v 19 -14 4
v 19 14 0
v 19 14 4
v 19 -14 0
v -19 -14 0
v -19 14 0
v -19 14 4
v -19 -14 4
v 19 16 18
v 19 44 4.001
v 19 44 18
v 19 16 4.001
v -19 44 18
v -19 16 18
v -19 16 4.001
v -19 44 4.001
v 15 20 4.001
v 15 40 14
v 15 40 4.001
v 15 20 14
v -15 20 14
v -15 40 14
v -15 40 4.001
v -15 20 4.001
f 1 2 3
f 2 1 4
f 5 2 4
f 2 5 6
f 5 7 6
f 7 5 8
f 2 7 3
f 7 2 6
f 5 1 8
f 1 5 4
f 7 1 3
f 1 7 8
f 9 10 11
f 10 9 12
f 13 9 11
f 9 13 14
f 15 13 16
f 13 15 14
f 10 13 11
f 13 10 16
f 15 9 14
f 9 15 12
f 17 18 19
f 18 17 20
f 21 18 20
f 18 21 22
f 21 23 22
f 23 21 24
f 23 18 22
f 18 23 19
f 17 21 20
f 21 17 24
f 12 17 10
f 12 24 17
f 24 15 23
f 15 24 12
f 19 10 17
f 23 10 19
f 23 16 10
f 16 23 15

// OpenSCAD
// file: shapes.scad
module prism(l, w, h) {
	translate([-w/2, -l/2, -h/2]) polyhedron(points=[
		[0,0,h],
		[0,0,0],[w,0,0],
		[0,l,h],
		[0,l,0],[w,l,0]
	], faces=[
		[0,2,1],
		[3,4,5],
		[0,1,4,3],
		[1,2,5,4],
		[0,3,5,2],
	]);
}
// file: bevel.scad
module bevel(l, s) {
	scale([-1, 1, 1])
	rotate([0, -90, 0])
	linear_extrude(l)
	difference() {
		square([s, s]);
		translate([s, s]) circle(r=s, center=true);
	}
}


module bevel_inv(l, s) {
	scale([-1, 1, 1])
	rotate([0, -90, 0])
	linear_extrude(l)
	difference() {
		square([s, s]);
		difference() {
			square([s, s]);
			translate([s, s]) circle(r=s, center=true);
		}
	}
}
// file: hole.scad
module cylinder_outer(h,d=undef,d1=undef,d2=undef,fn=15) {
	fudge = cos(180/fn);
	cylinder(h=h,d=d/fudge,d1=d1/fudge,d2=d2/fudge,$fn=fn);
}

module hole(d, height, countersink=0, extra_above=false) {
	height = height - countersink;
	translate([0, 0, -(height+countersink)]) {
		translate([0, 0, height+0.001]) cylinder_outer(d1=d, d2=d*1.5, h=countersink);
		if (extra_above) {
			translate([0, 0, height+0.001]) cylinder_outer(d1=d, d2=d*2, h=countersink*3/2);
		}
		if (height > 0)
			translate([0, 0, -2]) cylinder_outer(d=d, h=height+2.1);
	}
}

module nut_trap(w, h, sides){
	cylinder(r = w / 2 / cos(180 / 6) + 0.05, h=h, $fn=6);
}

module rim(id, od, h) {
	difference() {
		cylinder_outer(h=h, d=od);
		translate([0, 0, -1]) cylinder(h=h+2, d=id);
	}
}

rim(8.5, 13, 2);
// file: util.scad
function repeat(x, c) = [for (i = [1 : c]) x];

module cube_centered_xy(s) {
	translate([0, 0, s[2]/2]) cube(s, center=true);
}

module cube_shell(size, wall_thickness, center=false) {
	if (center) {
		cube_shell_int(size, wall_thickness);
	} else {
		translate([size[0]/2 + wall_thickness, size[1]/2 + wall_thickness, 0])
		cube_shell_int(size, wall_thickness);
	}
}

module cube_shell_int(size, wall_thickness) {
	difference() {
		cube_centered_xy(size + [wall_thickness*2, wall_thickness*2, wall_thickness]);
		translate([0, 0, wall_thickness]) cube_centered_xy(size + [0, 0, 0.001]);
	}
}

module rotate_all(increment=90) {
	for (i = [0 : increment : 360]) {
		rotate(i) children();
	}
}

module mirror_all() {
	children();
	scale([-1, 1, 1]) children();
	scale([1, -1, 1]) children();
	scale([-1, -1, 1]) children();
}
// main file
use <../lib/util.scad>;
use <../lib/hole.scad>;
use <../lib/bevel.scad>;
use <../lib/shapes.scad>;

$fn = 30;

module case_shell(size, fsize, hole, thickness, clearance, style) {
	c = hole*2;
	difference() {
		union() {
			difference() {
				cube(size+repeat(thickness*2, 3), center=true);
				cube(size, center=true);
			}
			if (style == "hole") {
				mirror_all() translate([(fsize[0])/2-c/2, 0, -(fsize[2])/2]) {
					translate([0, -fsize[1]/2 + c/2, fsize[2]/2]) 
					difference() {
						cube([c, c, fsize[2]], center=true);
						rotate([0, 0, -90]) translate([-c/2-0.005, -c/2-0.005, size[2]/2+0.001]) rotate([0, 90, 0]) bevel(fsize[2]+0.002, c/2+0.005);
					}
				}
			}
		}
		mirror_all() translate([fsize[0]/2+0.001, fsize[1]/2+0.001, fsize[2]/2+ 0.001])
		rotate([0, 90, 180]) bevel(fsize[2]+0.002, c/2+0.005);
	}
}

module holes(hole, d, thickness, size, fsize) {
	c = hole/2+thickness*2;
	for (r = [0 : 180 : 180]) {
		rotate([0, 180, r]) translate([fsize[0]/2, 0, fsize[2]/2]) {
			translate([- c, fsize[1]/2-c, 0]) hole(d, size[2]+0.01, 1, true);
			translate([- c, -(fsize[1]/2-c), 0]) hole(d, size[2]+0.01, 1, true);
		}
	}
}

module box_base(length, width, height, thickness, style="hole", hole=0, clearance = 0.1, hm=0, extend=50) {
	size = [length, width, height];
	fsize = size+repeat(thickness*2, 3);
	difference() {
		translate([0, 0, fsize[2]/2])
		difference() {
			union() {
				case_shell(size, fsize, hole, thickness, clearance, style);
				translate([0, 0, -fsize[2]/2]) {
					children();
				}
			}
			cutoff = fsize+repeat(extend, 3);
			translate([0, 0, cutoff[2]/2-fsize[2]/2+thickness+hm*height]) cube(cutoff, center=true);
			
			if (style == "hole") {
				holes(hole, hole - clearance, thickness, size, fsize);
			}
		}
		if (style == "snap") {
			box_snap(size, fsize, thickness, 1 - hm, false);
		}
	}
}

module box_top(length, width, height, thickness, style="hole", hole=0, clearance = 0.1, hm=1, extend=50) {
	size = [length, width, height];
	fsize = size+repeat(thickness*2, 3);
	translate([0, 0, fsize[2]/2])
	difference() {
		union() {
			case_shell(size, fsize, hole, thickness, clearance, style);
			translate([0, 0, -fsize[2]/2]) {
				children();
			}
		}
		cutoff = fsize+repeat(extend, 3);
		translate([0, 0, -cutoff[2]/2+fsize[2]/2-thickness-hm*height+0.001]) cube(cutoff, center=true);
		
		if (style == "hole") {
			translate([0, 0, -thickness]) holes(hole, hole + clearance, thickness, size, fsize);
		}
	}
	if (style == "snap") {
		box_snap(size, fsize, thickness, hm, true);
	}
}

module box_snap(size, fsize, thickness, hm, top) {
	height = size[2];
	offset = 0;
	width = thickness * 4;
	ewidth = top ? 0 : thickness*0.1;
	catch_slant_height = 0.25 * thickness;
	l = (hm + 0.5) * size[2] + thickness + (top ? 0 : 0); //thickness * catch_slant_height / 3);
	mirror_all() {
		translate([fsize[0]/2-0.001, fsize[1]/2 - width - thickness * 2, fsize[2] - l]) {
			if (top) { cube([thickness*2, width, l]); }
			else {
				translate([-thickness/2+0.002, width/2, thickness*2 + catch_slant_height/2 -0.001]) rotate([0, 0, 180]) prism(width+ewidth, thickness, catch_slant_height);
			}
			translate([-thickness/2+0.002, width/2, thickness]) rotate([180, 0, 180]) prism(width+ewidth, thickness, thickness * 2);
		}
	}
}

box_base(30, 20, 10, 4, 1);
translate([0, 20*1.5, 0]) box_top(30, 20, 10, 4, 1);
